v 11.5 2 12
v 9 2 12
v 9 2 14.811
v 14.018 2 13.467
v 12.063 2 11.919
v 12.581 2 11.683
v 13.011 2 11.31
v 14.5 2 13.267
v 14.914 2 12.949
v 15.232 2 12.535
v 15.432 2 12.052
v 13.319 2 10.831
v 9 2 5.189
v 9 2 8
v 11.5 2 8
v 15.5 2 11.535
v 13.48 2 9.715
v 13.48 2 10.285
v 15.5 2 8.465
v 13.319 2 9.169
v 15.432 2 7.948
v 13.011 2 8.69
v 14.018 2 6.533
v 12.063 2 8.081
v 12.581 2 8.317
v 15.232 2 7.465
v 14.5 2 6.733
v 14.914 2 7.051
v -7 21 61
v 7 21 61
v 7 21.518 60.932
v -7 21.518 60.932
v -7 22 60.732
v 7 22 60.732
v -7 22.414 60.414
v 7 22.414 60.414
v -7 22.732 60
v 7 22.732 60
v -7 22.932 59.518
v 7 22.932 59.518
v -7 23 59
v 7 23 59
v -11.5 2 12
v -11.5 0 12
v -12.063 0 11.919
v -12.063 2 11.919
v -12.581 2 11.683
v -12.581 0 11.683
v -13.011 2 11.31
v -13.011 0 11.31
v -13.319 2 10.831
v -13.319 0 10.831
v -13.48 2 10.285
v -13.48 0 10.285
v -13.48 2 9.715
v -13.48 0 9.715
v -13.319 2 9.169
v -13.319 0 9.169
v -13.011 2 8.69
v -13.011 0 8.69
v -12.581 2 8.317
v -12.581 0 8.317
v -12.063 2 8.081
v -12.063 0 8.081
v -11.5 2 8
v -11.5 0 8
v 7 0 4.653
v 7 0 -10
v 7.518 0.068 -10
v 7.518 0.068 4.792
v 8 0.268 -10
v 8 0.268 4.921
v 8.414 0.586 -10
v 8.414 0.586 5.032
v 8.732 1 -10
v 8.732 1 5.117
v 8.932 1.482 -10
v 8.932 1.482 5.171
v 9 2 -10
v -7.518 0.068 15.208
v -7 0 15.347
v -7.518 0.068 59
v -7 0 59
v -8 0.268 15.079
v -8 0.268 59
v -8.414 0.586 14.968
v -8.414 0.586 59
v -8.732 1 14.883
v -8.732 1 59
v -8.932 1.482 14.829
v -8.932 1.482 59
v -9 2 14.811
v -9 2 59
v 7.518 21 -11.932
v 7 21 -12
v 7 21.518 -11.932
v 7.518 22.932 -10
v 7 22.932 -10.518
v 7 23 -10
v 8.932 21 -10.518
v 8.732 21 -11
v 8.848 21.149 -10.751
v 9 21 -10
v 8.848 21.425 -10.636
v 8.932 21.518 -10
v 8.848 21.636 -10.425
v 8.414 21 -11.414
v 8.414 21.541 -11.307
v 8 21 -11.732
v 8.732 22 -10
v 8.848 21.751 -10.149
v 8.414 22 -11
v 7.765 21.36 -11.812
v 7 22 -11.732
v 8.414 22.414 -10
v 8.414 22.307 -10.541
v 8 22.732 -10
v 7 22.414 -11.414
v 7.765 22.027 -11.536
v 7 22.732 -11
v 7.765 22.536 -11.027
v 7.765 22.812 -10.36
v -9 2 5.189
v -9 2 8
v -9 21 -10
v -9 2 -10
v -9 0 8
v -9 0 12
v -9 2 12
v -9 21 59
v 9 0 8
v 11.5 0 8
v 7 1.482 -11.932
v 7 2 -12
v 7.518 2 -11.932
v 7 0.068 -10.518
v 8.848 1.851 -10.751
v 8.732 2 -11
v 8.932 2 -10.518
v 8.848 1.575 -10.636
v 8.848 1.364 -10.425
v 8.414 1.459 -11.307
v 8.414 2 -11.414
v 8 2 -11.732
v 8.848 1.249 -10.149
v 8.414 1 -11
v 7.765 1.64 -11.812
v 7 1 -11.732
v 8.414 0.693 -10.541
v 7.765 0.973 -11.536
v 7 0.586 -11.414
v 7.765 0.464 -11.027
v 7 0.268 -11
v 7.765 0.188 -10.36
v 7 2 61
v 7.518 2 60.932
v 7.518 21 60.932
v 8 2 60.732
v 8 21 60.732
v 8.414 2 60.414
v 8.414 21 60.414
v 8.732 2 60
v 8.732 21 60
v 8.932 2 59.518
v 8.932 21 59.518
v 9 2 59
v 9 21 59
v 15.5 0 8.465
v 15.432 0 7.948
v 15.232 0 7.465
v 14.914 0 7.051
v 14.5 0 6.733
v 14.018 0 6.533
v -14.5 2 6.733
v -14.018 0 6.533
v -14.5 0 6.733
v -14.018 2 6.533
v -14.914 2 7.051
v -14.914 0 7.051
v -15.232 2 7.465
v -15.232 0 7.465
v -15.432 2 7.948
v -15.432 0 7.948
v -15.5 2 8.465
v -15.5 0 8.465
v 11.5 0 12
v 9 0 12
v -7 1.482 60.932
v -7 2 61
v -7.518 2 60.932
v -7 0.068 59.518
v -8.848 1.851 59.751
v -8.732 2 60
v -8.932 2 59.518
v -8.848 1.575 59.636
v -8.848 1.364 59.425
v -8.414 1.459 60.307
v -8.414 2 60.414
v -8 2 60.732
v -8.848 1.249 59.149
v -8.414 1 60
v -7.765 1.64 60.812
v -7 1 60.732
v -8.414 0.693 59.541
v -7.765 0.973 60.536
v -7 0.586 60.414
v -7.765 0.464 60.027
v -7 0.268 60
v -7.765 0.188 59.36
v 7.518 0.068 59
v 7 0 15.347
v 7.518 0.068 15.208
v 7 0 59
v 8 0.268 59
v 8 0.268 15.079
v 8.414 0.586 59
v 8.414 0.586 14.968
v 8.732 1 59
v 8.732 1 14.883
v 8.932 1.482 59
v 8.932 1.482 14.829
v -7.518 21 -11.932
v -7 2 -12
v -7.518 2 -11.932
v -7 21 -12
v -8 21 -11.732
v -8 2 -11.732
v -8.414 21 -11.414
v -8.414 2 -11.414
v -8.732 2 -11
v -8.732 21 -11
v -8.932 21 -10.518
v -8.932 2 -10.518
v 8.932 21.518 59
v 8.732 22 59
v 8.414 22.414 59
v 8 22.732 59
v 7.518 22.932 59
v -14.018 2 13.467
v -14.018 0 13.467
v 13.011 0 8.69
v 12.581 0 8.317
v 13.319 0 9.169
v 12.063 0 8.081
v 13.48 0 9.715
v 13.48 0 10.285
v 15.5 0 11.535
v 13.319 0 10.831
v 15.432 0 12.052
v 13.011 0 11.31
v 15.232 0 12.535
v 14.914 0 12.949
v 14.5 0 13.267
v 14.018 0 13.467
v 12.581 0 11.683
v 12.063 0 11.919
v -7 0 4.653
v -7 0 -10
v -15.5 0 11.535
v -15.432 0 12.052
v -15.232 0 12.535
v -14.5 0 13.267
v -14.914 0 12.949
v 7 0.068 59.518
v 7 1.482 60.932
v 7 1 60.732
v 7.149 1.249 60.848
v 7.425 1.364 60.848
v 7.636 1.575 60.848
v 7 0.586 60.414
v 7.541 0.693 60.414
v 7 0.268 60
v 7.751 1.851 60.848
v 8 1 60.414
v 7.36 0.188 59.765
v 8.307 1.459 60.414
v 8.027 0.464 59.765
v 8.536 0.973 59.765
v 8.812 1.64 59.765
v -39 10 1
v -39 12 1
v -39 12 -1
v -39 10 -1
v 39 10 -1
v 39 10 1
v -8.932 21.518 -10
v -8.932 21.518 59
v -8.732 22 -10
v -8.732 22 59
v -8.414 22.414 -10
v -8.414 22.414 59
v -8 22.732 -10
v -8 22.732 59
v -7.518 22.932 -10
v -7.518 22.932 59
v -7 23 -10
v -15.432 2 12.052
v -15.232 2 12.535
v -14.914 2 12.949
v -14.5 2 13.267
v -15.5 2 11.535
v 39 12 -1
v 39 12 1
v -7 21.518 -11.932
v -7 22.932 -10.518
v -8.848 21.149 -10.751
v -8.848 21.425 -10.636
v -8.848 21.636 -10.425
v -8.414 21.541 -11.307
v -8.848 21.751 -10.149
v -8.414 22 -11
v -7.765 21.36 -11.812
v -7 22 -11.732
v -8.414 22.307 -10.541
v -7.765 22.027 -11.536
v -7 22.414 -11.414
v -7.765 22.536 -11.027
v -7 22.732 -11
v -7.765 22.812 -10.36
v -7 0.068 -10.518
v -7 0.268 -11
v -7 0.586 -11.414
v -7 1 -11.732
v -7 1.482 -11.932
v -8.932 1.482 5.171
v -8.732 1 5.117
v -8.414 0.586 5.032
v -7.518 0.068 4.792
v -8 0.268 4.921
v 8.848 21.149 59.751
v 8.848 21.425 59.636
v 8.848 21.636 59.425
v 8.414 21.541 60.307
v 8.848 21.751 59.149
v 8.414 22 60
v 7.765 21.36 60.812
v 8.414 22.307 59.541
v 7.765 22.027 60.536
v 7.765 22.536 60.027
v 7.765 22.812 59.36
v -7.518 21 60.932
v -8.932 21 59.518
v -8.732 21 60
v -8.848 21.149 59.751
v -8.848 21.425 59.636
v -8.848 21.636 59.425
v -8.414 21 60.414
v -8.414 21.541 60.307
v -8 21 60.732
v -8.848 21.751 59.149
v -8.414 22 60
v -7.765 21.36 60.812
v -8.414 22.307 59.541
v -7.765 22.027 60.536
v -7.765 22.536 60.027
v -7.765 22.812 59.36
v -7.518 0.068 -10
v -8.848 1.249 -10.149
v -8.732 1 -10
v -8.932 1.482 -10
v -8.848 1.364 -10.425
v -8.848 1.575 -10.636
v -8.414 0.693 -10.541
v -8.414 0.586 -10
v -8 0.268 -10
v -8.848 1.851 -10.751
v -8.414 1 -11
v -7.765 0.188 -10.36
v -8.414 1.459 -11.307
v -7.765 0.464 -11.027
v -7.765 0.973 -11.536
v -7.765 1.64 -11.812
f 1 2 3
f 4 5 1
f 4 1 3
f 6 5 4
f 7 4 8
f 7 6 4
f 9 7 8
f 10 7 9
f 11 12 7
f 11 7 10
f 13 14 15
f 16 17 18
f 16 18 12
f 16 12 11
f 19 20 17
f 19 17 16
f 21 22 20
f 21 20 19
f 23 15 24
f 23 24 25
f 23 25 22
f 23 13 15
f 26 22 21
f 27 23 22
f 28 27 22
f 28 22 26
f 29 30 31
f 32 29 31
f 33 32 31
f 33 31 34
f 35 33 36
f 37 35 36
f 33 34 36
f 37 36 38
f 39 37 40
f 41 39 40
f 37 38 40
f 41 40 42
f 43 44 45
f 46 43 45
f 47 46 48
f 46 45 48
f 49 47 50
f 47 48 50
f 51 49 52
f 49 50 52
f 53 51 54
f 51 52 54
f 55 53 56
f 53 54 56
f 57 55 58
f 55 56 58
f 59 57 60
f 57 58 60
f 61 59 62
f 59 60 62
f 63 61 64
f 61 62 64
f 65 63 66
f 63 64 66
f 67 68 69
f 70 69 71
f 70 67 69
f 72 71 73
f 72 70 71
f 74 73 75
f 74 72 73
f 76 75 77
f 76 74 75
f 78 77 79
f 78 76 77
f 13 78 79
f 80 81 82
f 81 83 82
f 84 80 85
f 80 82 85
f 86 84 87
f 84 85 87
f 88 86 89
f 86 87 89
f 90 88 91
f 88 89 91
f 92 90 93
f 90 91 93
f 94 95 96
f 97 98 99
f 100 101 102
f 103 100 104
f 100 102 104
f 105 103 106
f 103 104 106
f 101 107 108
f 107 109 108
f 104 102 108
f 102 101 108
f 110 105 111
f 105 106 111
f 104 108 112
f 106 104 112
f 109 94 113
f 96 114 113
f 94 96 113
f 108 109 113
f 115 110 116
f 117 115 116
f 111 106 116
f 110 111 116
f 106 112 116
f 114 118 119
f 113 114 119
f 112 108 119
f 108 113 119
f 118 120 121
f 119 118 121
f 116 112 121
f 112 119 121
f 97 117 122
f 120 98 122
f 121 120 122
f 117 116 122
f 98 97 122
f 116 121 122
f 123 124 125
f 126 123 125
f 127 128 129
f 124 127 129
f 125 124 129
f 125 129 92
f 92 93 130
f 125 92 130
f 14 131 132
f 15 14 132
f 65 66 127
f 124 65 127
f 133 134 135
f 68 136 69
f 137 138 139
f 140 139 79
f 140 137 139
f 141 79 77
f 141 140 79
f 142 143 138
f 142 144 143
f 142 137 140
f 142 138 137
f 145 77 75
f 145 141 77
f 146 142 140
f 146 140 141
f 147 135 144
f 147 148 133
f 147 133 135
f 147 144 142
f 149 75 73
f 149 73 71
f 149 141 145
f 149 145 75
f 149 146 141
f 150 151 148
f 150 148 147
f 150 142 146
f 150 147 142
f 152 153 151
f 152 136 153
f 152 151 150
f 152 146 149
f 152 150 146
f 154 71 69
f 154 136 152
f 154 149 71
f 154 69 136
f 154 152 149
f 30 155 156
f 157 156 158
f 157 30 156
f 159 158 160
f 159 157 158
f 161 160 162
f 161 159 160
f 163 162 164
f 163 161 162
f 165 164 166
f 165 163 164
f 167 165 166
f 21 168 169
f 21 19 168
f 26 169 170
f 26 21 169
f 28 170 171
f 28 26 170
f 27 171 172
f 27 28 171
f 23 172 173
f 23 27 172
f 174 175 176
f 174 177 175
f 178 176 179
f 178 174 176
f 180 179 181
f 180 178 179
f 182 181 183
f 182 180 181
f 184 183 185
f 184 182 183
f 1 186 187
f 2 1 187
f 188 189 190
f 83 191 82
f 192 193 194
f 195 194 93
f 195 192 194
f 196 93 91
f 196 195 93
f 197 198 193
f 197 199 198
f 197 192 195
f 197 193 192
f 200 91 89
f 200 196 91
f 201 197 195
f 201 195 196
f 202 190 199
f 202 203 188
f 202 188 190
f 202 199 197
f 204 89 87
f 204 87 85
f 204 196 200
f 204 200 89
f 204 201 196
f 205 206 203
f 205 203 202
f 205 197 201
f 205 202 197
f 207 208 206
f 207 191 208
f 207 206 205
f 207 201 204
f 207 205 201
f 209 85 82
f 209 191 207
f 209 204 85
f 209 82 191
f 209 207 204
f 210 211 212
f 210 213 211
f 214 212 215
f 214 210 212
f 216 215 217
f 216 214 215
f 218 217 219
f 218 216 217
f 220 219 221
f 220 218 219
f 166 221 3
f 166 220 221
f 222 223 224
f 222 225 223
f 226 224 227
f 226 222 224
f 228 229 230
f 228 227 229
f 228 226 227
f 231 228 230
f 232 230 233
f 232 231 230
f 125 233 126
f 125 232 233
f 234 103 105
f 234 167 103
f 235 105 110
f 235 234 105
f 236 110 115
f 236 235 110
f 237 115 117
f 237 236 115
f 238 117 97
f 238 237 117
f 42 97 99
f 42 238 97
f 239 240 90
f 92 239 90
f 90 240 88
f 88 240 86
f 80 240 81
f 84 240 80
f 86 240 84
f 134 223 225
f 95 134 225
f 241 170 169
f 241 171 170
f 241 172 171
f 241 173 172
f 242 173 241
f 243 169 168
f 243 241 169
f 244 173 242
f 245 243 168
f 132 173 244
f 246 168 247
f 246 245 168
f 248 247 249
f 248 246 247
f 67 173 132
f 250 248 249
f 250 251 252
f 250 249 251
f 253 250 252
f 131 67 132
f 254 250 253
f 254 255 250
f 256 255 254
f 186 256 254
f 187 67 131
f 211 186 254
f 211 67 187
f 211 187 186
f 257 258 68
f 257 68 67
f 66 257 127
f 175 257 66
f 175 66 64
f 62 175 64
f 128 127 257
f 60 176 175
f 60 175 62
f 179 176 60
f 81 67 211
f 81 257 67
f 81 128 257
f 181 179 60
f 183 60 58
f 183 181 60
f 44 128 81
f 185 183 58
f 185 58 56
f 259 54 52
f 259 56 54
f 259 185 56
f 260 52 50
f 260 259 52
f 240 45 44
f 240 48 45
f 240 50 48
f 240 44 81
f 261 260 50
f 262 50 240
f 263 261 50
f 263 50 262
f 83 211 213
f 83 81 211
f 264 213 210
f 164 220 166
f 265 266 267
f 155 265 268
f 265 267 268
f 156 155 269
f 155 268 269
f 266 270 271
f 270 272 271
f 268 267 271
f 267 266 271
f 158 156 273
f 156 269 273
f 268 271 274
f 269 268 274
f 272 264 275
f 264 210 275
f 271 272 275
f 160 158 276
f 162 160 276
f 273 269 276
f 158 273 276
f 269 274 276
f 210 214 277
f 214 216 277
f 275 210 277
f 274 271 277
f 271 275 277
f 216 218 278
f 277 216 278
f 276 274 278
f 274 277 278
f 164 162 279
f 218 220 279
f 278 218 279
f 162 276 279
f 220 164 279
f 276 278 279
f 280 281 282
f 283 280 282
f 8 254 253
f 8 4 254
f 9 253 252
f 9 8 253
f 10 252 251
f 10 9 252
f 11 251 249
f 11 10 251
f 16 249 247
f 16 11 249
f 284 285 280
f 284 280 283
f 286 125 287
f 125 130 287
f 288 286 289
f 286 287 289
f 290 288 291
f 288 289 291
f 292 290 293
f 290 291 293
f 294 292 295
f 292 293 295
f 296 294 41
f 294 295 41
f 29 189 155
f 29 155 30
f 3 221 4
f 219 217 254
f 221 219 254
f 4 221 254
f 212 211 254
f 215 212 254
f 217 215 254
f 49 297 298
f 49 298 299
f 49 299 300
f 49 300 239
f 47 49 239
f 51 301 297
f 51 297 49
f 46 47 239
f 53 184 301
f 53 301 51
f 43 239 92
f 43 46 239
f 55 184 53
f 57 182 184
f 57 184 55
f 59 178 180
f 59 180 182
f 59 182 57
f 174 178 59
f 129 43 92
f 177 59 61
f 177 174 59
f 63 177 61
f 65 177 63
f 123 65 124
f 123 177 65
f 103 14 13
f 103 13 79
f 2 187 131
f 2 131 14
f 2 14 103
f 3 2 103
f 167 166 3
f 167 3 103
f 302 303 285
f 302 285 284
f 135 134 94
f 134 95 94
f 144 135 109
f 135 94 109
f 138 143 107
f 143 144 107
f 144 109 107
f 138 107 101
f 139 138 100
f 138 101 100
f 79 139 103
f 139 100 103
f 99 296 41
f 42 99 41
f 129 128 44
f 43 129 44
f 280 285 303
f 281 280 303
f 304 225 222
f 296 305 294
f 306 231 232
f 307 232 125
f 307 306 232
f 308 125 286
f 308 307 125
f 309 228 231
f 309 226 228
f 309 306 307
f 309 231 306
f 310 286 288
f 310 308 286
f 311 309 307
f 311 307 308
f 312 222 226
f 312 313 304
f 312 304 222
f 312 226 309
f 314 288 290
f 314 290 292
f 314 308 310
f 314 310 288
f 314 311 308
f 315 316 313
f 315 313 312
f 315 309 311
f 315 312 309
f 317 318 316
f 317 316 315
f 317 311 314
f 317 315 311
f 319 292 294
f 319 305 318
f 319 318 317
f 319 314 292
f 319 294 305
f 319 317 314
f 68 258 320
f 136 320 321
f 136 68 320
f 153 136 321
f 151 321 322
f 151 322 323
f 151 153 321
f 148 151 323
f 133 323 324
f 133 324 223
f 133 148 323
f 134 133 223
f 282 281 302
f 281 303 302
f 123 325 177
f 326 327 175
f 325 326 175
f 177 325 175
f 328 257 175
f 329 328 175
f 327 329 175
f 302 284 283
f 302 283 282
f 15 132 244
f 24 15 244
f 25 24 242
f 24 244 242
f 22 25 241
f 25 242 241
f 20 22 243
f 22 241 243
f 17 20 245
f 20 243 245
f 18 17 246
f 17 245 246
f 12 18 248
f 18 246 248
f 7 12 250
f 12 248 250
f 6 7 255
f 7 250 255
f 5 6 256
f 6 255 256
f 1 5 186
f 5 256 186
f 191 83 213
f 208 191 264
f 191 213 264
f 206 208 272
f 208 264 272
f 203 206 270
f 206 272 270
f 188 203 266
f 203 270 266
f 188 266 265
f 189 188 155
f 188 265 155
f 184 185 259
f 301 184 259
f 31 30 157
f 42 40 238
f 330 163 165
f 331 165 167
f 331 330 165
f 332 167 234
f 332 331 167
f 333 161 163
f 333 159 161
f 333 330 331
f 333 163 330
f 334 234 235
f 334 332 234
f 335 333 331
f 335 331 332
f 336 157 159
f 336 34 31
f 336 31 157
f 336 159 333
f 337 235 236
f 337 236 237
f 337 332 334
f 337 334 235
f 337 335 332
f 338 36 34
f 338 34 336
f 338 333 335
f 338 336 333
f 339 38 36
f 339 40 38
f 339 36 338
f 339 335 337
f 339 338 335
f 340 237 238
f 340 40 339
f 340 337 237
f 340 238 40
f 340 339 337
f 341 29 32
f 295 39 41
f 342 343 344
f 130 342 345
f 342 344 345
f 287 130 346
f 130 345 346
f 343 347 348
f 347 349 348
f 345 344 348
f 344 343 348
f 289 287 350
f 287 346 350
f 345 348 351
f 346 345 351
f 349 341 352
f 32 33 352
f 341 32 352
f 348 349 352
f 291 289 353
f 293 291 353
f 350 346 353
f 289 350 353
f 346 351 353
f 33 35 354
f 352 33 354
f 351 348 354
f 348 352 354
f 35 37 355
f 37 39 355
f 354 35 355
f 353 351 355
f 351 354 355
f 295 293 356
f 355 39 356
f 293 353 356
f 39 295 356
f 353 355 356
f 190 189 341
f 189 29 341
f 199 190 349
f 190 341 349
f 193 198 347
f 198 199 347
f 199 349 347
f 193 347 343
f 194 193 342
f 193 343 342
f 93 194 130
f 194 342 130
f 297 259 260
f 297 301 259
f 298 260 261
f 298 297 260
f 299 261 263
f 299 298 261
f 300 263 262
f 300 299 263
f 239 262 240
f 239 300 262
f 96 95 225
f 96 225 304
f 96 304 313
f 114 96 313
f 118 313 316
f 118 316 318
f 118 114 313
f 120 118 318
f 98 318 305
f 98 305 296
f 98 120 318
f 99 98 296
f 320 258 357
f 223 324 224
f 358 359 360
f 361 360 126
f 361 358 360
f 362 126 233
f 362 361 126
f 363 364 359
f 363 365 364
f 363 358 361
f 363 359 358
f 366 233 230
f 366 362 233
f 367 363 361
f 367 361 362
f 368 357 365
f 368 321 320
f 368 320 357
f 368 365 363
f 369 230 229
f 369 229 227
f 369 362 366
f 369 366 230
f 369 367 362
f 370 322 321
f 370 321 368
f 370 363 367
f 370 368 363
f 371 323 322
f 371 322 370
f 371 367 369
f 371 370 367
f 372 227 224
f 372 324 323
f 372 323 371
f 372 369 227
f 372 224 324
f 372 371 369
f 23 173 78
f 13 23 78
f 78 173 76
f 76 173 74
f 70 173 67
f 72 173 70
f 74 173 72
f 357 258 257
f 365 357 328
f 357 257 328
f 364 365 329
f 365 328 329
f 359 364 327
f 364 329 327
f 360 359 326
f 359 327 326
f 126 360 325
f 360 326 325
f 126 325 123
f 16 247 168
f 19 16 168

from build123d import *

# Parameters (mm, degrees)
HOLES_EXTRUDE_DEPTH      = 2
HOLES_EXTRUDE_2_DEPTH    = 2
MOTOR_START              = -9
MOTOR_EXTRUDE_OUTLINE_W  = 23
MOTOR_EXTRUDE_OUTLINE_H  = 73
MOTOR_EXTRUDE_DEPTH      = 18
SKETCH3_W                = 2
SKETCH3_H                = 2
LEFT_SHAFT_EXTRUDE_DEPTH = 39
MOTOR_EDGE_FILLET_R      = 2
HOLES_FILLET_R           = 2


# Read off the part's stored shape, not the designer's step: Motor Extrude
with BuildPart() as part:
    # Bottom Profile Sketch → Holes Extrude (new body)
    with BuildSketch(Plane(origin=(0, 0, 0), x_dir=(1, 0, 0), z_dir=(0, 1, 0))):
        with BuildLine():
            Line((-9, -8), (-9, -5.189022297))
            Line((-9, -5.189022297), (-15.5, -6.930692048))
            Line((-15.5, -6.930692048), (-15.5, -13.069307952))
            Line((-15.5, -13.069307952), (-9, -14.810977703))
            Line((-9, -14.810977703), (-9, -12))
            Line((-9, -12), (-11.5, -12))
            ThreePointArc((-11.5, -12), (-13.5, -10), (-11.5, -8))
            Line((-11.5, -8), (-9, -8))
        make_face()
    extrude(amount=HOLES_EXTRUDE_DEPTH)



with BuildPart() as body_2:
    # Bottom Profile Sketch → Holes Extrude 2 (new body)
    with BuildSketch(Plane(origin=(0, 0, 0), x_dir=(1, 0, 0), z_dir=(0, 1, 0))):
        with BuildLine():
            Line((15.5, -6.930692048), (9, -5.189022297))
            Line((9, -5.189022297), (9, -8))
            Line((9, -8), (11.5, -8))
            ThreePointArc((11.5, -8), (13.5, -10), (11.5, -12))
            Line((11.5, -12), (9, -12))
            Line((9, -12), (9, -14.810977703))
            Line((9, -14.810977703), (15.5, -13.069307952))
            Line((15.5, -13.069307952), (15.5, -6.930692048))
        make_face()
    extrude(amount=HOLES_EXTRUDE_2_DEPTH)


with BuildPart() as part_1:
    add(part.part)

    add(body_2.part)  # Motor Extrude merges body 2
    # Motor Extrude outline → Motor Extrude (add)
    with BuildSketch(Plane.YZ.offset(MOTOR_START)):
        with Locations((11.5, 24.5)):
            Rectangle(MOTOR_EXTRUDE_OUTLINE_W, MOTOR_EXTRUDE_OUTLINE_H)
    extrude(amount=MOTOR_EXTRUDE_DEPTH)

    # Motor Edge Fillet
    motor_edge_fillet_edges = [part_1.edges().sort_by_distance(p)[0] for p in [
        (0, 0, -12),
        (0, 23, -12),
        (9, 11.5, -12),
        (9, 0, -3.405488851),
        (9, 0, 37.905488851),
        (0, 0, 61),
        (0, 23, 61),
        (9, 11.5, 61),
        (-9, 11.5, 61),
        (-9, 0, -3.405488851),
        (-9, 0, 37.905488851),
        (-9, 11.5, -12),
        (-9, 23, 24.5),
        (9, 23, 24.5),
    ]]
    fillet(motor_edge_fillet_edges, radius=MOTOR_EDGE_FILLET_R)

    # Holes Fillet
    holes_fillet_edges = [part_1.edges().sort_by_distance(p)[0] for p in [
        (-15.5, 1, 13.069307952),
        (-15.5, 1, 6.930692048),
        (15.5, 1, 13.069307952),
        (15.5, 1, 6.930692048),
    ]]
    fillet(holes_fillet_edges, radius=HOLES_FILLET_R)


with BuildPart() as body_2_2:
    # Sketch3 → Left Shaft Extrude (new, symmetric)
    with BuildSketch(Plane(origin=(0, 0, 0), x_dir=(0, 0, -1), z_dir=(1, 0, 0))):
        with Locations((0, 11)):
            Rectangle(SKETCH3_W, SKETCH3_H)
    extrude(amount=LEFT_SHAFT_EXTRUDE_DEPTH, both=True)


solid = Compound([part_1.part, body_2_2.part])
